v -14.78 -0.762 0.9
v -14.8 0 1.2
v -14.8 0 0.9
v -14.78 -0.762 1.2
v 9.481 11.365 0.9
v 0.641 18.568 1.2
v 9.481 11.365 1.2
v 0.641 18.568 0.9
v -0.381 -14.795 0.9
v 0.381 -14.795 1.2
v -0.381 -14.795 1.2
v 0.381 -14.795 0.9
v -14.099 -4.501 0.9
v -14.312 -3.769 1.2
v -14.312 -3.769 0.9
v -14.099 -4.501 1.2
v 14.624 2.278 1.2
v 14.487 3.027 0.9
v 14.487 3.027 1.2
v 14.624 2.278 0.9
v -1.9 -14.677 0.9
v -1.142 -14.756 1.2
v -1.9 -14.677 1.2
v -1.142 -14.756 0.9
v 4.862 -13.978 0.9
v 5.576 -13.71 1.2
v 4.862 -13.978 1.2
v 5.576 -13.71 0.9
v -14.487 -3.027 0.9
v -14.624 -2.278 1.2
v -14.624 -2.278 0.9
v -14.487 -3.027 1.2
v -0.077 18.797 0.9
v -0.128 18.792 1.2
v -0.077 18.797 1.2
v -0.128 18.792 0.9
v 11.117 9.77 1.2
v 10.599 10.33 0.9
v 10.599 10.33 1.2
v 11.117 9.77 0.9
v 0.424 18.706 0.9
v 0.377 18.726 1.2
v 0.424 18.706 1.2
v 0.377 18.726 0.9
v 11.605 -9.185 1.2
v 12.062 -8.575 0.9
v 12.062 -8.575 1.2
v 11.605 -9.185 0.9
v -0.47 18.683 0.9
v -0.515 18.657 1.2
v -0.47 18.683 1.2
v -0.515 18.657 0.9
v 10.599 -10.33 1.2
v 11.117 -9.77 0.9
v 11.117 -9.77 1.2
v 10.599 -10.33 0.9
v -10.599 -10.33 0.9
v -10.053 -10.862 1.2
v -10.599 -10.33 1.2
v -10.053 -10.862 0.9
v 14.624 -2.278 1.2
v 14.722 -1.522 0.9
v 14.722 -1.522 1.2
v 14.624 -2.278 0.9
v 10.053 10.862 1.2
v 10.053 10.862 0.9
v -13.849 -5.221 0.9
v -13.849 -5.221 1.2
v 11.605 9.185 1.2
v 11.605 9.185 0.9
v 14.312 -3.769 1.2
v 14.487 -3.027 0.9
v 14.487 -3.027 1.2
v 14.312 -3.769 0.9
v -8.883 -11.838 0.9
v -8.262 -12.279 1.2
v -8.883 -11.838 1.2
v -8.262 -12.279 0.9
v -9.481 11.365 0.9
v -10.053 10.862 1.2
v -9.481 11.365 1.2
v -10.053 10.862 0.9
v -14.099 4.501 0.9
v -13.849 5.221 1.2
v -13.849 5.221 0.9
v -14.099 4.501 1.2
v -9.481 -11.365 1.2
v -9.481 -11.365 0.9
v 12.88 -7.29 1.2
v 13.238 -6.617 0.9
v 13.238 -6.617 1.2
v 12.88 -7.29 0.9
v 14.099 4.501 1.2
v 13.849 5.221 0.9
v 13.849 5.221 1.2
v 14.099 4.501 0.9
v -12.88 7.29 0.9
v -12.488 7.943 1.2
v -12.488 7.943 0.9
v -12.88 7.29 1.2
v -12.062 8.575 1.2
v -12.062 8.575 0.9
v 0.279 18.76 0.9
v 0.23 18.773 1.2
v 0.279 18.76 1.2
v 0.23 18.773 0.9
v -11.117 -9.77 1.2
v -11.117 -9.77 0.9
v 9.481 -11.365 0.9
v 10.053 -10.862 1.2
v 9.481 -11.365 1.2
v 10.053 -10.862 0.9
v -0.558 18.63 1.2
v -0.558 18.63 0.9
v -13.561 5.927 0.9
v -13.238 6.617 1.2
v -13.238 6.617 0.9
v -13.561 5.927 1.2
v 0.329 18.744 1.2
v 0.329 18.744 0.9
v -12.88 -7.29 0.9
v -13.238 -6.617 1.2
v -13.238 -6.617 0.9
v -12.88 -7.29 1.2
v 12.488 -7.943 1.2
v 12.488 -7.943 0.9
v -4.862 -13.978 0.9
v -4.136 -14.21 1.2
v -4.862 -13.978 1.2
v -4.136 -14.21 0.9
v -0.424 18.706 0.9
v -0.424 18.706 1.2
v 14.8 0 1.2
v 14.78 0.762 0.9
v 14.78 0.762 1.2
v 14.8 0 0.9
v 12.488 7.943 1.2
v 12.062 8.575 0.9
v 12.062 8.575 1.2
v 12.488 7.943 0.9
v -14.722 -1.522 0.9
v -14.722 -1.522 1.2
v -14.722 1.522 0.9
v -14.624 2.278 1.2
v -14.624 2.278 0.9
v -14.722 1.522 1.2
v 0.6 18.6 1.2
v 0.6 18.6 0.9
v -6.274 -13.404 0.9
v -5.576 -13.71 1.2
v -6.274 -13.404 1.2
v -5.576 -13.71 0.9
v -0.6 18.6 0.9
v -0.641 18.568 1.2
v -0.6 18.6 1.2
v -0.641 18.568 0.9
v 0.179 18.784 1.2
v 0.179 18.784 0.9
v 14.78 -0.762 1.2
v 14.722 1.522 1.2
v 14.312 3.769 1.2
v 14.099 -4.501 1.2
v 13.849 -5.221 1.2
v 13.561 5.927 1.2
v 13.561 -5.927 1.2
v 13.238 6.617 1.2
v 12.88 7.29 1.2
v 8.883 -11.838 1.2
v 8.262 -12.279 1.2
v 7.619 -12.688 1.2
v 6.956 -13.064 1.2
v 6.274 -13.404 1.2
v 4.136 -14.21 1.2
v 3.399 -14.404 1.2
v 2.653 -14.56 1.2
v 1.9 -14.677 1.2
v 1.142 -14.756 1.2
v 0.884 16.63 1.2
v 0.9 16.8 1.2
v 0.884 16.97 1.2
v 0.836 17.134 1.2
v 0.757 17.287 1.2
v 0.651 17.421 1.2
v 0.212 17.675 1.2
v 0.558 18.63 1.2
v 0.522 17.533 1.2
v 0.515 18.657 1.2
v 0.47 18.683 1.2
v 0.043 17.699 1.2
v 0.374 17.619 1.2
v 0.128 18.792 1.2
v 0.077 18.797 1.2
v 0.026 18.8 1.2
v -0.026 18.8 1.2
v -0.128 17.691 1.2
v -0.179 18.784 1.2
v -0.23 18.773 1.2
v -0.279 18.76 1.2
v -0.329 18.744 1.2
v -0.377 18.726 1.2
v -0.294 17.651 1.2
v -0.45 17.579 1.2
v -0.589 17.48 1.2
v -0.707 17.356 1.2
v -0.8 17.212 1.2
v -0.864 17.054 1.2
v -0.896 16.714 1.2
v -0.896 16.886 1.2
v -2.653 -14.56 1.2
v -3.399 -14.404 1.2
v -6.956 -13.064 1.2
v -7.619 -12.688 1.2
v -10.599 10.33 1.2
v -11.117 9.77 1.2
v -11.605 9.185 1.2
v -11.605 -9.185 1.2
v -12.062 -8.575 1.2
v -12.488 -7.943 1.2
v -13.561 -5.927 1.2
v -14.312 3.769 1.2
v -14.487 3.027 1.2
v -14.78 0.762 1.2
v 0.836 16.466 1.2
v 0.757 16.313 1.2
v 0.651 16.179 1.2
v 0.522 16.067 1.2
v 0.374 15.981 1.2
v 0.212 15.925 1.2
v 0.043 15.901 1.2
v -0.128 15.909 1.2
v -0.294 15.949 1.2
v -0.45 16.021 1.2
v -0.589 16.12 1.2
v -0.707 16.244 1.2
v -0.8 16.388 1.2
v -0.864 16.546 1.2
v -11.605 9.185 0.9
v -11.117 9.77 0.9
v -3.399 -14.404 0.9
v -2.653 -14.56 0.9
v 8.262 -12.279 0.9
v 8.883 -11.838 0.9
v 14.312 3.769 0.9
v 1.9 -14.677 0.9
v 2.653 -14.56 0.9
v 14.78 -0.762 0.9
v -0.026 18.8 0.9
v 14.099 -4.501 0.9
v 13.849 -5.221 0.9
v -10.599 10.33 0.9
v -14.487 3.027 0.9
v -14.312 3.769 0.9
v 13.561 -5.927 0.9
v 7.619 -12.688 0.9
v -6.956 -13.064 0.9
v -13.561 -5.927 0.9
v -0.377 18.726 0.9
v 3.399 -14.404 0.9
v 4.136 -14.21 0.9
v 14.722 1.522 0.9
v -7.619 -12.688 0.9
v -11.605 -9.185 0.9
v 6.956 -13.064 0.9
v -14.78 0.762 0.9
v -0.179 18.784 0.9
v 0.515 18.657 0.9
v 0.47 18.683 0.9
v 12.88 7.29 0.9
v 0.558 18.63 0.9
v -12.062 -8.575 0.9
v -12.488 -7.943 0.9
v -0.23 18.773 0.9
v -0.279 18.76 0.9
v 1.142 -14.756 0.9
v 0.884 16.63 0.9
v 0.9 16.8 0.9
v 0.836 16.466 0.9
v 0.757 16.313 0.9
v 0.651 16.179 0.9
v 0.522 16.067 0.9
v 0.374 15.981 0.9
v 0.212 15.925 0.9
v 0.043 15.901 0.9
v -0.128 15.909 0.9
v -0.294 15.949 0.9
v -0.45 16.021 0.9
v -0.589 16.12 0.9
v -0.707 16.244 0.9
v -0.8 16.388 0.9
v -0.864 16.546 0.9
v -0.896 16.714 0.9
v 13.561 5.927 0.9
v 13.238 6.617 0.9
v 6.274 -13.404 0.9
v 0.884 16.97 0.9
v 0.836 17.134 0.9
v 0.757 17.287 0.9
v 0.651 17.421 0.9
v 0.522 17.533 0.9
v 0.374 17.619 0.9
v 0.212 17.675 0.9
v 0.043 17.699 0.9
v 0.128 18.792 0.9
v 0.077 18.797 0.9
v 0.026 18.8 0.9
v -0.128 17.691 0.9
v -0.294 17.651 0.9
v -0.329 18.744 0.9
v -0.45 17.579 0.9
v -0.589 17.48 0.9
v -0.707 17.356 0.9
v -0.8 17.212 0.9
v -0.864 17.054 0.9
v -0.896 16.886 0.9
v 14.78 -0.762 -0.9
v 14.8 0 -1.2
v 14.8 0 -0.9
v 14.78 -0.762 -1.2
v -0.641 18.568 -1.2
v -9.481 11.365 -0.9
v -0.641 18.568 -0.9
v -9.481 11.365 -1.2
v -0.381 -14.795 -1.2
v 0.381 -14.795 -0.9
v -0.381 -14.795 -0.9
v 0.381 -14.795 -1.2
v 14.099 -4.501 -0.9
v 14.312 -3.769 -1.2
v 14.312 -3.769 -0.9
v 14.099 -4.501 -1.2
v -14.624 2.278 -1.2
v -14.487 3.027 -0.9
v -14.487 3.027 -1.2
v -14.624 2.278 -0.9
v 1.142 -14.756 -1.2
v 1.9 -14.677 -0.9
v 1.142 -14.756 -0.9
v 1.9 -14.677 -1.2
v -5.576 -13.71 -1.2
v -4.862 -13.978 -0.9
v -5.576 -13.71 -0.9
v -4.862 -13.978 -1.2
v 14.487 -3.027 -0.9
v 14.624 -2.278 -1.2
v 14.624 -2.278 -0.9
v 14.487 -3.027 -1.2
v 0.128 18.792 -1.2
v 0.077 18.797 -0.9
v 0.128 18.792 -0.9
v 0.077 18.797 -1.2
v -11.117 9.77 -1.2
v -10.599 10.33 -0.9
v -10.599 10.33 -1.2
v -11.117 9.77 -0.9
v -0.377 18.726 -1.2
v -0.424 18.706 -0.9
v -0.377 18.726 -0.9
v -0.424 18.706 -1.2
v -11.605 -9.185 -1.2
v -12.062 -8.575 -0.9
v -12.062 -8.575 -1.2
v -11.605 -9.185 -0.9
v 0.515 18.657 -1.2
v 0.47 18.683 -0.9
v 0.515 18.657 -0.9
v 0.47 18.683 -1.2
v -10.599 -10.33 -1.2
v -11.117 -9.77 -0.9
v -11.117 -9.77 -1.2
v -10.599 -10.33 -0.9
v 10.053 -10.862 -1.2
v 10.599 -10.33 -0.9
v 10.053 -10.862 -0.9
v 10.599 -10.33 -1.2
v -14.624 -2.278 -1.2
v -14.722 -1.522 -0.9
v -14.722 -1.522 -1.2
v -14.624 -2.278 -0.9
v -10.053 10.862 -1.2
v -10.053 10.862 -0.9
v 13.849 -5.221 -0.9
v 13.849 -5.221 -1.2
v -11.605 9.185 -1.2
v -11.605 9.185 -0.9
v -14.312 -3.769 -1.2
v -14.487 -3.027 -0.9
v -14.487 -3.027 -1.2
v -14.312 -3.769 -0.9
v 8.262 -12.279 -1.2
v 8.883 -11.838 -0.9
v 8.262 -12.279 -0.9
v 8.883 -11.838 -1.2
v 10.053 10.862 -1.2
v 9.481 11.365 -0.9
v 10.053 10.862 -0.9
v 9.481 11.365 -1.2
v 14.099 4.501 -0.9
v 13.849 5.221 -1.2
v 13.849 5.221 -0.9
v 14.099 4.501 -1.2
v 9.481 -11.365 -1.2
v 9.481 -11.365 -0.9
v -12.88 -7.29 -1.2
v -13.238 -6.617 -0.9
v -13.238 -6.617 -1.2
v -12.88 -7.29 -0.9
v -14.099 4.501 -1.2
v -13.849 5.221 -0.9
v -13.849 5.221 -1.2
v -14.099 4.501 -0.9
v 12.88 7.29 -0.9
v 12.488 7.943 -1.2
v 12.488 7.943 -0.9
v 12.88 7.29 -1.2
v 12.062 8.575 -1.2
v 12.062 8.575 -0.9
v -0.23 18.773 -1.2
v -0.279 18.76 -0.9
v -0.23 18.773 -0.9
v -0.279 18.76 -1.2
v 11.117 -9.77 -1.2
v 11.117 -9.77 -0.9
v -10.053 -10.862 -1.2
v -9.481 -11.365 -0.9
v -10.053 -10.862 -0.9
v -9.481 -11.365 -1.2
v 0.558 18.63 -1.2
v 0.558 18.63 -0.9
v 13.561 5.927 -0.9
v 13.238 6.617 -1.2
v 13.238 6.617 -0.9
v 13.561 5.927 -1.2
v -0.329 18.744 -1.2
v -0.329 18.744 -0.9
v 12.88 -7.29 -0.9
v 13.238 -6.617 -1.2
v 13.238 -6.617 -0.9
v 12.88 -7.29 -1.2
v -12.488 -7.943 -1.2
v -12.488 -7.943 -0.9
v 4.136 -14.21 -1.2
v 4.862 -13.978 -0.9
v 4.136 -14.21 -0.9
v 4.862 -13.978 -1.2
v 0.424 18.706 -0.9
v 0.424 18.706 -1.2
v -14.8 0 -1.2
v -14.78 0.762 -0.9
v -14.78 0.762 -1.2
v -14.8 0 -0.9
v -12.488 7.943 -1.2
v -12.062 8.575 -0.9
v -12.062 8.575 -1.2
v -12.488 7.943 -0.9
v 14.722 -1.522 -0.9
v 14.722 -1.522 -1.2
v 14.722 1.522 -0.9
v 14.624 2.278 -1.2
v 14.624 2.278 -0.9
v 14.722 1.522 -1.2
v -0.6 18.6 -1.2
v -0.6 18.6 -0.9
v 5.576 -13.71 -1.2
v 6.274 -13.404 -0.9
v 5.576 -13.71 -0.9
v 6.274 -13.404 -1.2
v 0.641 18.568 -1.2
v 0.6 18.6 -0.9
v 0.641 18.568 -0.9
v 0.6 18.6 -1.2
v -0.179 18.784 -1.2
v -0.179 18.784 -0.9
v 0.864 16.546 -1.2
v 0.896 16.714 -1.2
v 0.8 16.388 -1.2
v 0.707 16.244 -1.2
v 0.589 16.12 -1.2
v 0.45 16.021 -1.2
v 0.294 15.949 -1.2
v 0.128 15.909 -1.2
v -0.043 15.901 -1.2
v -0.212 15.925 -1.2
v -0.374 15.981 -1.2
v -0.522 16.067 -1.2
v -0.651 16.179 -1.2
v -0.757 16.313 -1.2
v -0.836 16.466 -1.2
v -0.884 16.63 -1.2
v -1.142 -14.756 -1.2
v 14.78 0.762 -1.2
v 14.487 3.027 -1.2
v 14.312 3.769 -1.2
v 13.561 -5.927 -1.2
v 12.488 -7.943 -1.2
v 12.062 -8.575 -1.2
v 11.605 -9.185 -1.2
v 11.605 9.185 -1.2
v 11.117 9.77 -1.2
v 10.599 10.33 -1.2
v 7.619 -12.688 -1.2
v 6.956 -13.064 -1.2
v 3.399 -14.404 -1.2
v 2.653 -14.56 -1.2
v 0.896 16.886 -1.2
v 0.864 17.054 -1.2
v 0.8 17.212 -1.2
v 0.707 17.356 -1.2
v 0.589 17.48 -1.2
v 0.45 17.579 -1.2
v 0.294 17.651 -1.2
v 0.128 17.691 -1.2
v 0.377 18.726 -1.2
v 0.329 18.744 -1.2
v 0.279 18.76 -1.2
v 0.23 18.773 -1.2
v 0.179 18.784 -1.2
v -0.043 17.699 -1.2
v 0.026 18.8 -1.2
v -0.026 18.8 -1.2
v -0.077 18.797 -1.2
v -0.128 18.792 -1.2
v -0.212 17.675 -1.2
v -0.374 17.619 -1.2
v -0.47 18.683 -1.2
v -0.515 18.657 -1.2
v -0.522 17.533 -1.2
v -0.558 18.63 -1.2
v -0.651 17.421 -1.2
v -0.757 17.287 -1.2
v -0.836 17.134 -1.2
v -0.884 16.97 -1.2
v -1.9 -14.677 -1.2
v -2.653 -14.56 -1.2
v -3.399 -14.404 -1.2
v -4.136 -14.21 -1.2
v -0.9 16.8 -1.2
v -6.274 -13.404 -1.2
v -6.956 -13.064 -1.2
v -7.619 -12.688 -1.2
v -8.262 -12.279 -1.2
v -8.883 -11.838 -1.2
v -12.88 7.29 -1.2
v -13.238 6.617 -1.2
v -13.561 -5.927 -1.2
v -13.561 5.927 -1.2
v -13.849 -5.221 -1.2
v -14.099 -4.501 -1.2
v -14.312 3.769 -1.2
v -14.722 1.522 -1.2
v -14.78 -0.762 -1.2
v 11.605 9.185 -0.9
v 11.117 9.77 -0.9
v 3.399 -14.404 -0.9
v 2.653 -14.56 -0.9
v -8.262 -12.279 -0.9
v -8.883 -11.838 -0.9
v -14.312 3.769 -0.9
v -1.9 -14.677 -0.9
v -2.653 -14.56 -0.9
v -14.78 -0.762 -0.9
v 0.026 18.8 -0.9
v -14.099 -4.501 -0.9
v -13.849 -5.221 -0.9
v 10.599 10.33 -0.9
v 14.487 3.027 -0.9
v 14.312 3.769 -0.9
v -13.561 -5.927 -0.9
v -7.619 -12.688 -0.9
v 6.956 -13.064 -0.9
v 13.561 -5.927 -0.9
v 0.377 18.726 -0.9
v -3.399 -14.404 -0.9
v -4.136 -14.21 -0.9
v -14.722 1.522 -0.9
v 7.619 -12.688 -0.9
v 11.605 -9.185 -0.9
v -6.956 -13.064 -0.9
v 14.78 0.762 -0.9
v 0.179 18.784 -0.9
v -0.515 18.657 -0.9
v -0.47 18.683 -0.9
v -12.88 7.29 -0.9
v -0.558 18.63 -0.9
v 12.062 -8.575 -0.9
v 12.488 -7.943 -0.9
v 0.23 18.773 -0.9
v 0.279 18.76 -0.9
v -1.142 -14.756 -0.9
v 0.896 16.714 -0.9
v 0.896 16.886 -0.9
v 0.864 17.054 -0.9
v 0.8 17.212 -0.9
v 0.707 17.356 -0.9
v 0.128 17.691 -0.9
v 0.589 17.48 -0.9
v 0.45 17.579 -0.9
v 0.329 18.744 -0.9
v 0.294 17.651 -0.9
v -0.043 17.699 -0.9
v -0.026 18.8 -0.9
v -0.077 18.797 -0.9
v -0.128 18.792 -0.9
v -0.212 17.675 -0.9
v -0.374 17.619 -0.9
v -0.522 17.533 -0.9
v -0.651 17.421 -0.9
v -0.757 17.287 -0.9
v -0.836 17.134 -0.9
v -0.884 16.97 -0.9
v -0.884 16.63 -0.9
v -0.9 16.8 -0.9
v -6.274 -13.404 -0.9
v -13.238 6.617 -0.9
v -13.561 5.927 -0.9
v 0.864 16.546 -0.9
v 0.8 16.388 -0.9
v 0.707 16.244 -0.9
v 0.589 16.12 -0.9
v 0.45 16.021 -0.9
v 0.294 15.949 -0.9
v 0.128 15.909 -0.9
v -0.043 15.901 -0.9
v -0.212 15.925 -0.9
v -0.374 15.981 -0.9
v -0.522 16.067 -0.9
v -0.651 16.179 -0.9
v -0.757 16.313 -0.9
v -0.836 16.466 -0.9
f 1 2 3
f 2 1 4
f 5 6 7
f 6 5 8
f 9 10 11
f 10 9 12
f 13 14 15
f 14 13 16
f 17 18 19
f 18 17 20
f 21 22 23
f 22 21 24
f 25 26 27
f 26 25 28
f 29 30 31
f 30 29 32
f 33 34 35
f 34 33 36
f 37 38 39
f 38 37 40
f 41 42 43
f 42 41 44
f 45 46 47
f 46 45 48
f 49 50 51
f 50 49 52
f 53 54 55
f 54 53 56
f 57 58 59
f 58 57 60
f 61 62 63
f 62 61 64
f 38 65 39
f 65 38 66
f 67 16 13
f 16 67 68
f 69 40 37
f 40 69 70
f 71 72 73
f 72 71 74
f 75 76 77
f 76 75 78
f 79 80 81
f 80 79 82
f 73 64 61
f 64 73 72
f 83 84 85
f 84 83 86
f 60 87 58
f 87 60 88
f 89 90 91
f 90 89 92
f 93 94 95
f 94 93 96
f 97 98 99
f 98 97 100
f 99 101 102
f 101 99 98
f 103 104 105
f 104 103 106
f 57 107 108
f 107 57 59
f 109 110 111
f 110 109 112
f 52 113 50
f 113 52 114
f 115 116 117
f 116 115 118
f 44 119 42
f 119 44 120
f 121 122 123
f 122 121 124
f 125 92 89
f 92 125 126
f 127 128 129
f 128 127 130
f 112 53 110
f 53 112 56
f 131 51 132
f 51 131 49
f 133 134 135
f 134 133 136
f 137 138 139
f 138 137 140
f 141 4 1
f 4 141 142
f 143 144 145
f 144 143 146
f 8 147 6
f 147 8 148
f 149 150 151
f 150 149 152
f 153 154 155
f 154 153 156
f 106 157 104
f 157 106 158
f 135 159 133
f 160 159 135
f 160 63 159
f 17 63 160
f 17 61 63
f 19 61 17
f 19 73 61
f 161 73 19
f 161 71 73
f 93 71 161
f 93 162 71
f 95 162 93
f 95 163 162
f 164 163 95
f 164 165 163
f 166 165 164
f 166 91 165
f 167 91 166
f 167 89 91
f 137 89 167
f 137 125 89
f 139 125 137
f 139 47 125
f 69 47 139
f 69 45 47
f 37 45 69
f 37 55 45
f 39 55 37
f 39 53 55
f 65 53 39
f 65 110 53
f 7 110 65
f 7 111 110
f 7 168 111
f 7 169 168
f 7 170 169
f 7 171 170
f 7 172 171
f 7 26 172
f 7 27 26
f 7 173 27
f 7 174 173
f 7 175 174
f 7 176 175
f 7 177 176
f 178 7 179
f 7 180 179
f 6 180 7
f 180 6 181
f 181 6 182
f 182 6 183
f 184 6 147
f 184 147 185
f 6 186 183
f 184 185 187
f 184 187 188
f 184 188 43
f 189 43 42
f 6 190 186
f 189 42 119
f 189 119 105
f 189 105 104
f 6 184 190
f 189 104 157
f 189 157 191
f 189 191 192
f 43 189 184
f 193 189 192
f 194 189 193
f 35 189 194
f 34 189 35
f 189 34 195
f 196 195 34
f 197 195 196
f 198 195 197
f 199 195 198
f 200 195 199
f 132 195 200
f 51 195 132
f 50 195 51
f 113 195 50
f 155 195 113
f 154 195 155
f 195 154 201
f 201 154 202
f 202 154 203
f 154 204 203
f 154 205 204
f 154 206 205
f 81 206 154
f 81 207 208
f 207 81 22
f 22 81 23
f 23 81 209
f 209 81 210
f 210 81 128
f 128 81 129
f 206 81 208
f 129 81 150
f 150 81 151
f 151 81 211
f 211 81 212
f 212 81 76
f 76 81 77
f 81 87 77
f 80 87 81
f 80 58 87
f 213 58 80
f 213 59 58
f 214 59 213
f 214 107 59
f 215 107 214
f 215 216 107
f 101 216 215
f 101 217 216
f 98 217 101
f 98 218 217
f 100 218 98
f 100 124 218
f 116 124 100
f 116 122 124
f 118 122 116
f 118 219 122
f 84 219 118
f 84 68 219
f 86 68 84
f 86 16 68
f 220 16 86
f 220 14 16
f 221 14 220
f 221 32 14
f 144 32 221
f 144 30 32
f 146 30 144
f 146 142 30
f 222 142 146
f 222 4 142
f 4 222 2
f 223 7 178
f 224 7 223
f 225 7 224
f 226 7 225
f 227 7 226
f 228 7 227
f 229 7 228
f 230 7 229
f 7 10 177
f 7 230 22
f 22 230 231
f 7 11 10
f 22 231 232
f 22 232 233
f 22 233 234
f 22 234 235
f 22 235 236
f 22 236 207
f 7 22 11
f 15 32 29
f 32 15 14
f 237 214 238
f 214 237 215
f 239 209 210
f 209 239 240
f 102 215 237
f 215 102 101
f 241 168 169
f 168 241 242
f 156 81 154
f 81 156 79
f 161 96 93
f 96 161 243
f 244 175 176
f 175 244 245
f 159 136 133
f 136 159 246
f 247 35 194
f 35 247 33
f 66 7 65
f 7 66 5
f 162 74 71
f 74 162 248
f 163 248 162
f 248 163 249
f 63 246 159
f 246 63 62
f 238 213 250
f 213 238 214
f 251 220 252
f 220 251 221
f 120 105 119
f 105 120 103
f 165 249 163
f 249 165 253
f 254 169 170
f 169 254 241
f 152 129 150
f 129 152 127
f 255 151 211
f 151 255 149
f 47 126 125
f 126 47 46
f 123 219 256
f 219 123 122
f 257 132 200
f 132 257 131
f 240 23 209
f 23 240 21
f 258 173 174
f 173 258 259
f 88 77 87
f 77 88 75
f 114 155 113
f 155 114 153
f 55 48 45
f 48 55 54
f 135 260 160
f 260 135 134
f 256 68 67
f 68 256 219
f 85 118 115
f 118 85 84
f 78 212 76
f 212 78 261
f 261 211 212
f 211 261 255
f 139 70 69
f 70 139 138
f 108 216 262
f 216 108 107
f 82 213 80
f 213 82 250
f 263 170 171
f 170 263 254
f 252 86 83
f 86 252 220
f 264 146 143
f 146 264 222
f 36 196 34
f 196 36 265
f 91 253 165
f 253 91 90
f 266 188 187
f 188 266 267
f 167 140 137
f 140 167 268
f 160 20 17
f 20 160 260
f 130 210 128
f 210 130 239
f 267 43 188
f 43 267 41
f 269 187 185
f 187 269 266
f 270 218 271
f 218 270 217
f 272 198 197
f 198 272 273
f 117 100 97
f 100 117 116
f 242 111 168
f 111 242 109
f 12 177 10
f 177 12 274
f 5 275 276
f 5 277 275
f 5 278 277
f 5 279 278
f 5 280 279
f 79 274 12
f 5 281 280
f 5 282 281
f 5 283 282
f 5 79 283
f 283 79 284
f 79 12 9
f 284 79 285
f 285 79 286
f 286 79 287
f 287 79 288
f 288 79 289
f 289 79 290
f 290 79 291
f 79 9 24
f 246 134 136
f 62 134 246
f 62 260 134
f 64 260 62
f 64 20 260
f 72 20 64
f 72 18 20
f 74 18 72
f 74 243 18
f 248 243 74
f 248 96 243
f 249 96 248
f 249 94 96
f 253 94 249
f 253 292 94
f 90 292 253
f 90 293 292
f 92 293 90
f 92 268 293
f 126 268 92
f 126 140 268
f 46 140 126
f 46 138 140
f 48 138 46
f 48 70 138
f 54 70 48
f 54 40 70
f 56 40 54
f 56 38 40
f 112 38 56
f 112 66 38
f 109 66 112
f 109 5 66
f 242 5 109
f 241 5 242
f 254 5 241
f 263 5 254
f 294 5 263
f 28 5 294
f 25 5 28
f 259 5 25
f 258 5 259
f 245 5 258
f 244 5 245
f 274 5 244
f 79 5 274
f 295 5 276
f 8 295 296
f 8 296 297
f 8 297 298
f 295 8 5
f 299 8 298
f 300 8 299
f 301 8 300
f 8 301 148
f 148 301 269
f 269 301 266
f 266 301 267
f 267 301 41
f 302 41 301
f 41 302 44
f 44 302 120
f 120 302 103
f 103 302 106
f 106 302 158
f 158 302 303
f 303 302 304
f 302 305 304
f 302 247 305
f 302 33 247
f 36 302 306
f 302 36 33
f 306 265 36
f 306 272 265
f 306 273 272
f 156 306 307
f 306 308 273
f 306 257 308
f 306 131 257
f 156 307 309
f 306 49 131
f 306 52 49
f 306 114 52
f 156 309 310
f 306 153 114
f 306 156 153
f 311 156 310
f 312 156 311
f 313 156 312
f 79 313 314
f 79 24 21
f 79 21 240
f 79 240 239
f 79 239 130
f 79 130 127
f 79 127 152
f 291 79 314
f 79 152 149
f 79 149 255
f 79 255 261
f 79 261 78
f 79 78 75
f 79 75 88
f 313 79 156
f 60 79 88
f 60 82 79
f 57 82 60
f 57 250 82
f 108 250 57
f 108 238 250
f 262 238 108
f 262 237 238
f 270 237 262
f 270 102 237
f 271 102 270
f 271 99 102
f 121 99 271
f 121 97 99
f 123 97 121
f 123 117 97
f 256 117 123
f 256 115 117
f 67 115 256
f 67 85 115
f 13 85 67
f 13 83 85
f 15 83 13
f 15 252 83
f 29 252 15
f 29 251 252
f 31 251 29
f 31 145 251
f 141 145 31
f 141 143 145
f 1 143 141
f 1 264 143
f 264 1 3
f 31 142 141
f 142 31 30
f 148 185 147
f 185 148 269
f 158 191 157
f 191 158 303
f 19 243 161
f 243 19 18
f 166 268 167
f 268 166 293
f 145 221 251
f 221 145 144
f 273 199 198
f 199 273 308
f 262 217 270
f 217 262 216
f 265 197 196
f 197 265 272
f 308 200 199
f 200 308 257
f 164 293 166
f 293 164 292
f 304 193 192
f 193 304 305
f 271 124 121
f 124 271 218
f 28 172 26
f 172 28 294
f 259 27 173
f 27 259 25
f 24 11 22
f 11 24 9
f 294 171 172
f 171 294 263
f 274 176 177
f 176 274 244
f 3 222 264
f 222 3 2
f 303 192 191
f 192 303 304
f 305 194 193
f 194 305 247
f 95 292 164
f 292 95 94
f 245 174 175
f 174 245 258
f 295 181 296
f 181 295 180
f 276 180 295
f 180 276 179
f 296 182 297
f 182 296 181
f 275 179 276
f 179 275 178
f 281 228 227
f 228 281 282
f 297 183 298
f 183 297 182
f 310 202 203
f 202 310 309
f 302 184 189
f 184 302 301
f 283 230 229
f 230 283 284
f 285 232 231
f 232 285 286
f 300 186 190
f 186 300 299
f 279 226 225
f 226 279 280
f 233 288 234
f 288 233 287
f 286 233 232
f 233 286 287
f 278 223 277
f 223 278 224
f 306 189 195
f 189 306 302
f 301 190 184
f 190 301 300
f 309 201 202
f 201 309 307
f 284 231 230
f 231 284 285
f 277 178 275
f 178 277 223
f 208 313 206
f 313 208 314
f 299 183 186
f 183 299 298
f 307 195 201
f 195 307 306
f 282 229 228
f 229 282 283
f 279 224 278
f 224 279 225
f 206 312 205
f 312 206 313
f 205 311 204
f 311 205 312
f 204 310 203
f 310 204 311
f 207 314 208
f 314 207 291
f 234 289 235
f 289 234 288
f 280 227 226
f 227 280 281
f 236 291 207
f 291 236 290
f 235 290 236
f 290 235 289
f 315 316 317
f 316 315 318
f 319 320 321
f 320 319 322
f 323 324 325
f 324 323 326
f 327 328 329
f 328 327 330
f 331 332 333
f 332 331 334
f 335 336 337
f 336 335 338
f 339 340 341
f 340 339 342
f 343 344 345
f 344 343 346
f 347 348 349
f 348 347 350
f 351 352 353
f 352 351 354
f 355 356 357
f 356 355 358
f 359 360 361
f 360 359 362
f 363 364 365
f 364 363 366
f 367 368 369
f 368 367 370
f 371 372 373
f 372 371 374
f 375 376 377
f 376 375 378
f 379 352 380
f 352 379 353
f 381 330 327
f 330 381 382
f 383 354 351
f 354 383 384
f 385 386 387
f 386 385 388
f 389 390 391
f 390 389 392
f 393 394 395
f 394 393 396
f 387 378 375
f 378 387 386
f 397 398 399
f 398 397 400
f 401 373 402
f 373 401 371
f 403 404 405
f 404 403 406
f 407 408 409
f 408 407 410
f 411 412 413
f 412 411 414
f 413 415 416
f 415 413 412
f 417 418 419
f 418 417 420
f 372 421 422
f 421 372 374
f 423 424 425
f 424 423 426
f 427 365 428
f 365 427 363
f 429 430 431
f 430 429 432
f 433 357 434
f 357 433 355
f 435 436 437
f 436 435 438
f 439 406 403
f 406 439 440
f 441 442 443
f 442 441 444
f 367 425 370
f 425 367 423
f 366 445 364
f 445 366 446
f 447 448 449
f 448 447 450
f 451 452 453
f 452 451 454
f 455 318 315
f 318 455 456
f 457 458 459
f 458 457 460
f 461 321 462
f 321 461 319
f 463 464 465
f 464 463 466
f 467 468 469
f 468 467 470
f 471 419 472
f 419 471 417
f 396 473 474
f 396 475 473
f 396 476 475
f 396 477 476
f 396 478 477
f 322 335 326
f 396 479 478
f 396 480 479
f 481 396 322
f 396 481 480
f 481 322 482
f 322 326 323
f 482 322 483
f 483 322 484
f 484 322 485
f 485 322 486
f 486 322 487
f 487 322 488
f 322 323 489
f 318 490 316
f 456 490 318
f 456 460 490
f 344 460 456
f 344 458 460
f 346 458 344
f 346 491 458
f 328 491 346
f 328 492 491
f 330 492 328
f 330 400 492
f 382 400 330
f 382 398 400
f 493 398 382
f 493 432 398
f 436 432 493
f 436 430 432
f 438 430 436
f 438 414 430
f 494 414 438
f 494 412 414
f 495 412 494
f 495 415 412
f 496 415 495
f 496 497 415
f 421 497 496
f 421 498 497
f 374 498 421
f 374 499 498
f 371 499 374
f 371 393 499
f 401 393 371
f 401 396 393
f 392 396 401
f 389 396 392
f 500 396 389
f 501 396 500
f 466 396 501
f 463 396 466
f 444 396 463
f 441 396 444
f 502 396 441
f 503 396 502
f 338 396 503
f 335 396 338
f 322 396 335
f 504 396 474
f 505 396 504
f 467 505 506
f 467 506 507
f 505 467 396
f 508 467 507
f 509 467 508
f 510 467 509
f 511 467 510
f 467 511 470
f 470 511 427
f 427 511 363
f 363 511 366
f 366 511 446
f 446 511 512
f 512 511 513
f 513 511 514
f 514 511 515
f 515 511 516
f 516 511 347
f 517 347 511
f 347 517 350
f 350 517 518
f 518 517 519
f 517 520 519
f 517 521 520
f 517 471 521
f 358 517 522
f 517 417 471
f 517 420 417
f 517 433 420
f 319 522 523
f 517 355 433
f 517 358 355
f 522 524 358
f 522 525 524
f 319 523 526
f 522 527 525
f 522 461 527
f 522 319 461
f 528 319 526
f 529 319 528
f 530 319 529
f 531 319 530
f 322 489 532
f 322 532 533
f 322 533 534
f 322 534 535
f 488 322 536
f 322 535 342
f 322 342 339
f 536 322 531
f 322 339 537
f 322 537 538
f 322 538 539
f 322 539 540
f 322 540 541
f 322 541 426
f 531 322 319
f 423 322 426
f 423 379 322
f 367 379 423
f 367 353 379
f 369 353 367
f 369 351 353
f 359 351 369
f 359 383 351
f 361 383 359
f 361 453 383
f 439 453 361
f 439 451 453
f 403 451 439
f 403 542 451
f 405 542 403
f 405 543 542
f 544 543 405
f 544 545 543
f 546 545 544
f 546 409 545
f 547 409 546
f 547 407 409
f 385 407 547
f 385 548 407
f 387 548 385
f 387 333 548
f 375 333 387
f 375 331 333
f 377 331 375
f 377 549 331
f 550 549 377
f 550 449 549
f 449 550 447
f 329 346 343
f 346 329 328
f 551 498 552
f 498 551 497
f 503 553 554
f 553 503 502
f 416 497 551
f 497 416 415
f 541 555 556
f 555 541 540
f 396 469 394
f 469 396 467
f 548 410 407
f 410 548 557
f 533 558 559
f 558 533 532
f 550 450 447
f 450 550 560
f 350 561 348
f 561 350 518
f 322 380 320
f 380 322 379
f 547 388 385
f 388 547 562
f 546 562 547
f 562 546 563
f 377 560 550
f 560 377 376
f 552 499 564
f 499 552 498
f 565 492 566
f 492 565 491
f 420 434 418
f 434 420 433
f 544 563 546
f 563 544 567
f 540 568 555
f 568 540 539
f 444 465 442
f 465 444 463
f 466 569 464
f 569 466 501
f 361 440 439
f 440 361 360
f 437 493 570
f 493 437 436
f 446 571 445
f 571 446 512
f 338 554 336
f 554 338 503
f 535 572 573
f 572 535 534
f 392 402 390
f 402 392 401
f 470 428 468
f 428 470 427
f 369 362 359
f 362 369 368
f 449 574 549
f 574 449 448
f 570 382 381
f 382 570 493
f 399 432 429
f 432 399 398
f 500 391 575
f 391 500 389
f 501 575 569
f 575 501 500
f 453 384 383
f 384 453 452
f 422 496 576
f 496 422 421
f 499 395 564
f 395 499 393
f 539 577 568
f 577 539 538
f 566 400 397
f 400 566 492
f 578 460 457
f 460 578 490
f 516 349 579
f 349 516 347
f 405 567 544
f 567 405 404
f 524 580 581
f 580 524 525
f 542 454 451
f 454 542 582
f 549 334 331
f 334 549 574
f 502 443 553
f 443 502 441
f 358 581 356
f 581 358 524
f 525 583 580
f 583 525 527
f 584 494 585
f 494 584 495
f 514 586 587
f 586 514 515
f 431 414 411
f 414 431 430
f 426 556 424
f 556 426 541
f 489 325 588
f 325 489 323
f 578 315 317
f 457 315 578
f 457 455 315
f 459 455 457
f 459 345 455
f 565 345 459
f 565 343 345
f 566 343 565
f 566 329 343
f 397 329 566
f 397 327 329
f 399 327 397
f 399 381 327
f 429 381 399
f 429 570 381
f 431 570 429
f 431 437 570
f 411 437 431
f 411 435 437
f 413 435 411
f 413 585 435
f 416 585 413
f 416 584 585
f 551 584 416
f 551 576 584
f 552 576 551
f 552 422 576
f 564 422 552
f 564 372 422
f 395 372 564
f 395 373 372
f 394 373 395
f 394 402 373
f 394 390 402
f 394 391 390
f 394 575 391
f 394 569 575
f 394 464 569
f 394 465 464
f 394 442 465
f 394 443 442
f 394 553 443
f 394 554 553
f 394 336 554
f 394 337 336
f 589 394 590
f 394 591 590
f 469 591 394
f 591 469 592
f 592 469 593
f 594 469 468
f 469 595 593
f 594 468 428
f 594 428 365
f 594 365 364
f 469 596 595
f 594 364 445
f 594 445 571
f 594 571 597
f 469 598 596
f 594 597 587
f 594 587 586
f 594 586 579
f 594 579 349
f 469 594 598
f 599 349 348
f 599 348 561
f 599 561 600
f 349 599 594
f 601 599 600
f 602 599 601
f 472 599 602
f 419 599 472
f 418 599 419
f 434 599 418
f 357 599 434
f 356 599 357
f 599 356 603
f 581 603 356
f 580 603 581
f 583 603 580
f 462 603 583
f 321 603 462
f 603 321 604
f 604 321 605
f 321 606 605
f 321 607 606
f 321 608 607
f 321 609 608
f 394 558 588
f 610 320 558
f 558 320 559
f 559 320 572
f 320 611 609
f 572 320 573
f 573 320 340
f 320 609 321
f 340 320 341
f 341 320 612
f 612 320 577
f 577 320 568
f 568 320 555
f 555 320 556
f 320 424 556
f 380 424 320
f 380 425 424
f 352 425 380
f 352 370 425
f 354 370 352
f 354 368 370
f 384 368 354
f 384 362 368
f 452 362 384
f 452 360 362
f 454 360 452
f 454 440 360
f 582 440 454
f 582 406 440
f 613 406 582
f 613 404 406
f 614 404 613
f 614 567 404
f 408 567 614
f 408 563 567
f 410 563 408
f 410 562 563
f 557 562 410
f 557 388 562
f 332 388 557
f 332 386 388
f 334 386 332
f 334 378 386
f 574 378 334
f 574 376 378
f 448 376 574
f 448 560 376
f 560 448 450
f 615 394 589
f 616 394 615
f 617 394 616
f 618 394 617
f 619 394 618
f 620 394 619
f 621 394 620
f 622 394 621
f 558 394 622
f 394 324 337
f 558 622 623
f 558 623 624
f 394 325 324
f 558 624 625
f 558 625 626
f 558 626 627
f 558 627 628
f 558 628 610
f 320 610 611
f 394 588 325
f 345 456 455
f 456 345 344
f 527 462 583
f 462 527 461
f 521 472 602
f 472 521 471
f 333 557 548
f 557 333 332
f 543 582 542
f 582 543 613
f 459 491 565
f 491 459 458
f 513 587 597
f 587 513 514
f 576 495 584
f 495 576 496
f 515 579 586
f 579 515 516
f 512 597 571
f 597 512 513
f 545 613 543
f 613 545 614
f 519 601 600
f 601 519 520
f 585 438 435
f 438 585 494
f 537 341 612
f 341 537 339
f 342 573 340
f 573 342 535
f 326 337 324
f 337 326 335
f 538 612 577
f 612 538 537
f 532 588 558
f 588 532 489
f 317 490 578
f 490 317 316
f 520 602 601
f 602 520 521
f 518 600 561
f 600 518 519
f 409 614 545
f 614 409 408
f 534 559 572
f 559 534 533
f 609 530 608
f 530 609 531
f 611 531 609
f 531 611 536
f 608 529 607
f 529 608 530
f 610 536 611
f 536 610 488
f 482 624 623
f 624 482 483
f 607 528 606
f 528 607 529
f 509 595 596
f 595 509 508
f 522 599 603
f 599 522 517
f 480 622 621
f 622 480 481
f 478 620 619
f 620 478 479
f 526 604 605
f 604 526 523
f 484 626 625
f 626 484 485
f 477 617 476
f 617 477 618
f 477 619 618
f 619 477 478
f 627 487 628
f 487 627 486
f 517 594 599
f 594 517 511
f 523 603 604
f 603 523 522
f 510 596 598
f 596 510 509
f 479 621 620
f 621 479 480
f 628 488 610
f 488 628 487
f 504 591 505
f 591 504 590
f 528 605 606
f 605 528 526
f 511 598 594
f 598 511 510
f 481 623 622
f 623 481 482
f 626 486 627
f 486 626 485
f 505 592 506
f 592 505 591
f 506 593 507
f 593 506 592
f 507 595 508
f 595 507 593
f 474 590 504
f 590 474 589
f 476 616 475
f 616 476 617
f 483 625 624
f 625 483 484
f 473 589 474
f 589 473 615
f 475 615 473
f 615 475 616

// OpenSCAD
// file: ../Parts/rounder.scad
// rounder.scad
// cutting tool for rounding off corners with a cylinder

//---------------------
module rounder(
r=10,   // radius
h=10,   // height
f=22,    // $fn
extra=0.01  // extra size for the cube
){

difference(){
  translate([-extra,-extra,-extra])
  cube([r+extra,r+extra,h+2*extra]);
  translate([r,r,-1])
  cylinder(r=r,h=h+2,$fn=f);
}

}

//---------------------------------------------------------------------------
module bevel(x=1,y=1,h=10){

linear_extrude(height=h)
polygon(points=[[0,0],[x,0],[0,y]]);
    
}
  

//========================

rounder();

//========================
// main file
//=================================================================================
// Rosa.scad
//
//
// Dr Tom Flint, 11 Feb 2023
//=================================================================================

use <./Rosalees.scad>
use <../Parts/rounder.scad>

sx = 35;       // size of square
thick = 1.8;    // thickness
rx=1.5;           // rounding of corners

wide=5;   // frame width
tol=0.3;  // space between frame and part
ry=2;     // founder on frame

thick2 = 0.9;    // thickness for round version
rz=14.8;    // radius of round version

//-----------------------------------------------------------------------------------
module rosaBlack(){
  
  difference(){
    intersection(){
      scale([sx+1,sx+1,thick])
      Rosalees();
      translate([0,0,thick/2])
      cube([sx,sx,thick],center=true);
    }
    translate([sx/2,sx/2,-1])
    rotate([0,0,180])
    rounder(r=rx,h=thick+2,f=77);
    translate([-sx/2,sx/2,-1])
    rotate([0,0,-90])
    rounder(r=rx,h=thick+2,f=77);
    translate([-sx/2,-sx/2,-1])
    rotate([0,0,0])
    rounder(r=rx,h=thick+2,f=77);
    translate([sx/2,-sx/2,-1])
    rotate([0,0,90])
    rounder(r=rx,h=thick+2,f=77);
  }
}

//-----------------------------------------------------------------------------------
module rosaBlack2(){
  
    intersection(){
      scale([sx+1,sx+1,thick2])
      Rosalees();
      cylinder(r=rz,h=thick2,$fn=122);
    }

  difference(){
    hull(){
      cylinder(r=rz,h=thick2,$fn=122);
      translate([0,rz+3,0])
      cylinder(r=1,h=thick2,$fn=122);
    }
    cylinder(r=rz-0.5,h=3*thick2,center=true,$fn=122);
  }
}

//-----------------------------------------------------------------------------------
module rosaWhite2(){
  
  intersection(){
    difference(){
      translate([0,0,thick2/2])
      cube([sx-1,sx-1,thick2],center=true);
      translate([0,0,-1])
      scale([sx+1,sx+1,thick2+2])
      Rosalees();
    }
    cylinder(r=rz,h=thick2,$fn=122);
  }
}

//-----------------------------------------------------------------------------------
module rosaWhite(){
  
  difference(){
    translate([0,0,thick/2])
    cube([sx-1,sx-1,thick],center=true);
    translate([0,0,-1])
    scale([sx+1,sx+1,thick+2])
    Rosalees();
  }
}

//----------------------------------------------------------------------------------
module rosaFrame(){

  difference(){
    union(){
      translate([0,0,(thick-0.3)/2])
      cube([sx+wide,sx+wide,thick-0.3],center=true);
      hull(){
        translate([sx/3+1,0,(thick-0.3)/2])
        cube([sx/3,sx/2,thick-0.3],center=true);
        translate([sx+10,0,(thick-0.3)/2])
        cube([sx/4,sx/4,thick-0.3],center=true);
      }
      hull(){
        translate([0,sx/3+1,(thick-0.3)/2])
        cube([sx/2,sx/3,thick-0.3],center=true);
        translate([0,sx+10,(thick-0.3)/2])
        cube([sx/4,sx/4,thick-0.3],center=true);
      }
    }
    // center hole
    translate([0,0,thick])
    cube([sx+tol,sx+tol,3*thick],center=true);
    // material reduction
    hull(){
      translate([sx/2+7,0,(thick-0.3)/2])
      cylinder(r=4,h=10,center=true,$fn=44);
      translate([sx+8,0,(thick-0.3)/2])
      cylinder(r=2,h=10,center=true,$fn=44);
    }
    hull(){
      translate([0,sx/2+7,(thick-0.3)/2])
      cylinder(r=4,h=10,center=true,$fn=44);
      translate([0,sx+8,(thick-0.3)/2])
      cylinder(r=2,h=10,center=true,$fn=44);
    }
    
    translate([sx/2+wide/2,sx/2+wide/2,-1])
    rotate([0,0,180])
    rounder(r=ry,h=thick+2,f=77);
    translate([-sx/2-wide/2,sx/2+wide/2,-1])
    rotate([0,0,-90])
    rounder(r=ry,h=thick+2,f=77);
    translate([-sx/2-wide/2,-sx/2-wide/2,-1])
    rotate([0,0,0])
    rounder(r=ry,h=thick+2,f=77);
    translate([sx/2+wide/2,-sx/2-wide/2,-1])
    rotate([0,0,90])
    rounder(r=ry,h=thick+2,f=77);


  }

  // tabs
  translate([0,sx+13.5,1.5*thick])
  cube([sx/4,2,3*thick],center=true);
  translate([sx+13.5,0,1.5*thick])
  cube([2,sx/4,3*thick],center=true);

}

//-------------------------------------------------------------------------------------
module rosaBlack3(){
 
  difference(){
    union(){
      rosaBlack2();
      translate([0,0,0.01])
      rotate([0,180,0])
      rosaBlack2();
    }
    // cut for ear ring wire
    translate([0,rz+2,0])
    cylinder(r=0.9,h=20,center=true,$fn=33);
  }
}

//-------------------------------------------------------------------------------------
module rosaClear2(){
 
  translate([0,0,thick2])
  difference(){
     hull(){
      cylinder(r=rz,h=0.3,$fn=122);
      translate([0,rz+3,0])
      cylinder(r=1,h=0.3,$fn=122);
    }

    // cut for ear ring wire
    translate([0,rz+2,0])
    cylinder(r=0.9,h=20,center=true,$fn=33);
  }
}

//-------------------------------------------------------------------------------------
module rosaClear3(){
 
  rosaClear2();
  rotate([0,180,0])
  rosaClear2();
}

//-------------------------------------------------------------------------------------
module rosaWhite3(){
  
  rosaWhite2();
  rotate([0,180,0])
  rosaWhite2();
}
//===================================================================================
//color("cyan")
rosaClear3();

//rosaBlack3();
//rosaWhite3();

//rosaBlack2();
//rosaWhite2();


//rosaBlack();
//rosaWhite();

//rosaFrame();

//===================================================================================
